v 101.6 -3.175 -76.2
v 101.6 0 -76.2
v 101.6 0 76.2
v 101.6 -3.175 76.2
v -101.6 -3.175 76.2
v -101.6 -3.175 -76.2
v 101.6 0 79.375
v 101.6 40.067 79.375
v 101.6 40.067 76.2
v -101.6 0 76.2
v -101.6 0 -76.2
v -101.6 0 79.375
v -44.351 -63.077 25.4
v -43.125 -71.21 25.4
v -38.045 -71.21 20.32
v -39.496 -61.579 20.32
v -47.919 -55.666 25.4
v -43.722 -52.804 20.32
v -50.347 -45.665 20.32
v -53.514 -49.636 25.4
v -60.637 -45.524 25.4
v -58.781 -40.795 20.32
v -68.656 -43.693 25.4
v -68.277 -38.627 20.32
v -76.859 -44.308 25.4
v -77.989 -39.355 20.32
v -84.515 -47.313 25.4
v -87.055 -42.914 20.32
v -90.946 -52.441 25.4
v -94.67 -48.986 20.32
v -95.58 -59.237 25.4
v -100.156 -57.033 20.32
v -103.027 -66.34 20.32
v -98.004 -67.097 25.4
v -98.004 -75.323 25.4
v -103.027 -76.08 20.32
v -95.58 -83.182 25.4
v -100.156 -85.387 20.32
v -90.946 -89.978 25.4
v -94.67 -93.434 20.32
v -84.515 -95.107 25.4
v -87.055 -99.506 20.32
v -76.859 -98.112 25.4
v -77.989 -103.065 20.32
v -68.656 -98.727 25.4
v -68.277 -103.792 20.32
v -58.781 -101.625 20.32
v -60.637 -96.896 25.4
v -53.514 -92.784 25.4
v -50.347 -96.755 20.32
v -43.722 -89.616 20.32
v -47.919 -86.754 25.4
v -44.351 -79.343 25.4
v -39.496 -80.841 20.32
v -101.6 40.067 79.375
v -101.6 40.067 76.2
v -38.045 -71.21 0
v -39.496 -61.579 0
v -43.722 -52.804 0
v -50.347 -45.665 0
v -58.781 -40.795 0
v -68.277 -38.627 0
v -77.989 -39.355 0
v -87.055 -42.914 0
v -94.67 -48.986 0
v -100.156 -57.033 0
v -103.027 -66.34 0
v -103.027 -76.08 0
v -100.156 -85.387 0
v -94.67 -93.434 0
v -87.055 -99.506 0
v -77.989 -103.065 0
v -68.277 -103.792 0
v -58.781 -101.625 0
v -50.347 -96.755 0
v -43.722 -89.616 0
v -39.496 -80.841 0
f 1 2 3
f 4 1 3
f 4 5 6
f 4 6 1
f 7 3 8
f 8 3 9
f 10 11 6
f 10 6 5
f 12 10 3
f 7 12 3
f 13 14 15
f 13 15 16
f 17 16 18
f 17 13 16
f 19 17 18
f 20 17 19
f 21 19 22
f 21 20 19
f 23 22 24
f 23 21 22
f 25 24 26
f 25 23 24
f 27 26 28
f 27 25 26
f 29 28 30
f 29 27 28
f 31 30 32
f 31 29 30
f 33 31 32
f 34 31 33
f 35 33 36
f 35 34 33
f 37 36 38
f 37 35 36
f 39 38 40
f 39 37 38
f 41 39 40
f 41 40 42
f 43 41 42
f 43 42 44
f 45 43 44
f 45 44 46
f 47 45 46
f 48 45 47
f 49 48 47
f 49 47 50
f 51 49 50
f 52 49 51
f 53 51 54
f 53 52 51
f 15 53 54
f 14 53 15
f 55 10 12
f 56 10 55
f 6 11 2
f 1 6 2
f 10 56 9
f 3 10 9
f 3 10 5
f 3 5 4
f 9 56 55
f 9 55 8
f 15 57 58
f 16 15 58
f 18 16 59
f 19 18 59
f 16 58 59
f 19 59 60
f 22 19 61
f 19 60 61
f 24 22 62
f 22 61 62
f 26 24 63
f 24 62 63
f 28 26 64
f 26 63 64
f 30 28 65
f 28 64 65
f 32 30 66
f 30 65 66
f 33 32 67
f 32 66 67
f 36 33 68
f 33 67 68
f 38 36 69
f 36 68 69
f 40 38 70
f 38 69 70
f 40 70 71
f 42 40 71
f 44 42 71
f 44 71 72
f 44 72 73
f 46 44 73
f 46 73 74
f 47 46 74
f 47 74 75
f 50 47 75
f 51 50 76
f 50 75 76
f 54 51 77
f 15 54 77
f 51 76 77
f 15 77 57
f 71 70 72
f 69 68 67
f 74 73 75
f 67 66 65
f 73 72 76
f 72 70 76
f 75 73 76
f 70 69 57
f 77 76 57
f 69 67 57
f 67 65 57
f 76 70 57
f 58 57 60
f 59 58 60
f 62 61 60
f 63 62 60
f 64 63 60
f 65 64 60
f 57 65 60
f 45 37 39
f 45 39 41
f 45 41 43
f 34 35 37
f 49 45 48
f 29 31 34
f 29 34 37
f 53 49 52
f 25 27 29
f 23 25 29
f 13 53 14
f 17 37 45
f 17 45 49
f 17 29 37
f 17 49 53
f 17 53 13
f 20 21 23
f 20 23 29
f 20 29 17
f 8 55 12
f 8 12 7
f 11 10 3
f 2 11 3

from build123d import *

# Parameters (mm, degrees)
F0_W     = 203.2
F0_H     = 152.4
F1_DEPTH = 3.175
F2_W     = 203.2
F2_H     = 40.0667153299
F3_DEPTH = 3.175
F5_R     = 32.6737940356
F6_DEPTH = 25.4
F8_SIZE  = 5.08


# Not quite as in the source:
# - the program builds the solid bodies; features that only make, move or delete a surface that nothing else refers to are left out


with BuildPart() as f1:
    # F0 (on Front) → F1 (new body)
    with BuildSketch(Plane.XZ):
        Rectangle(F0_W, F0_H)
    extrude(amount=F1_DEPTH)


with BuildPart() as f3:
    # F2 (on face) → F3 (new body)
    with BuildSketch(Plane.XY.offset(76.2)):
        with Locations((0, 20.0333576649)):
            Rectangle(F2_W, F2_H)
    extrude(amount=F3_DEPTH)


with BuildPart() as f6:
    # F5 (on Top) → F6 (new body)
    with BuildSketch(Plane.XY):
        with Locations((-70.7184076309, -71.2099298835)):
            Circle(F5_R)
    extrude(amount=F6_DEPTH)

    # F8
    f8_edges = [f6.edges().sort_by_distance(p)[0] for p in [
        (-103.392202, -71.20993, 25.4),
    ]]
    chamfer(f8_edges, length=F8_SIZE)


solid = Compound([f1.part, f3.part, f6.part])
